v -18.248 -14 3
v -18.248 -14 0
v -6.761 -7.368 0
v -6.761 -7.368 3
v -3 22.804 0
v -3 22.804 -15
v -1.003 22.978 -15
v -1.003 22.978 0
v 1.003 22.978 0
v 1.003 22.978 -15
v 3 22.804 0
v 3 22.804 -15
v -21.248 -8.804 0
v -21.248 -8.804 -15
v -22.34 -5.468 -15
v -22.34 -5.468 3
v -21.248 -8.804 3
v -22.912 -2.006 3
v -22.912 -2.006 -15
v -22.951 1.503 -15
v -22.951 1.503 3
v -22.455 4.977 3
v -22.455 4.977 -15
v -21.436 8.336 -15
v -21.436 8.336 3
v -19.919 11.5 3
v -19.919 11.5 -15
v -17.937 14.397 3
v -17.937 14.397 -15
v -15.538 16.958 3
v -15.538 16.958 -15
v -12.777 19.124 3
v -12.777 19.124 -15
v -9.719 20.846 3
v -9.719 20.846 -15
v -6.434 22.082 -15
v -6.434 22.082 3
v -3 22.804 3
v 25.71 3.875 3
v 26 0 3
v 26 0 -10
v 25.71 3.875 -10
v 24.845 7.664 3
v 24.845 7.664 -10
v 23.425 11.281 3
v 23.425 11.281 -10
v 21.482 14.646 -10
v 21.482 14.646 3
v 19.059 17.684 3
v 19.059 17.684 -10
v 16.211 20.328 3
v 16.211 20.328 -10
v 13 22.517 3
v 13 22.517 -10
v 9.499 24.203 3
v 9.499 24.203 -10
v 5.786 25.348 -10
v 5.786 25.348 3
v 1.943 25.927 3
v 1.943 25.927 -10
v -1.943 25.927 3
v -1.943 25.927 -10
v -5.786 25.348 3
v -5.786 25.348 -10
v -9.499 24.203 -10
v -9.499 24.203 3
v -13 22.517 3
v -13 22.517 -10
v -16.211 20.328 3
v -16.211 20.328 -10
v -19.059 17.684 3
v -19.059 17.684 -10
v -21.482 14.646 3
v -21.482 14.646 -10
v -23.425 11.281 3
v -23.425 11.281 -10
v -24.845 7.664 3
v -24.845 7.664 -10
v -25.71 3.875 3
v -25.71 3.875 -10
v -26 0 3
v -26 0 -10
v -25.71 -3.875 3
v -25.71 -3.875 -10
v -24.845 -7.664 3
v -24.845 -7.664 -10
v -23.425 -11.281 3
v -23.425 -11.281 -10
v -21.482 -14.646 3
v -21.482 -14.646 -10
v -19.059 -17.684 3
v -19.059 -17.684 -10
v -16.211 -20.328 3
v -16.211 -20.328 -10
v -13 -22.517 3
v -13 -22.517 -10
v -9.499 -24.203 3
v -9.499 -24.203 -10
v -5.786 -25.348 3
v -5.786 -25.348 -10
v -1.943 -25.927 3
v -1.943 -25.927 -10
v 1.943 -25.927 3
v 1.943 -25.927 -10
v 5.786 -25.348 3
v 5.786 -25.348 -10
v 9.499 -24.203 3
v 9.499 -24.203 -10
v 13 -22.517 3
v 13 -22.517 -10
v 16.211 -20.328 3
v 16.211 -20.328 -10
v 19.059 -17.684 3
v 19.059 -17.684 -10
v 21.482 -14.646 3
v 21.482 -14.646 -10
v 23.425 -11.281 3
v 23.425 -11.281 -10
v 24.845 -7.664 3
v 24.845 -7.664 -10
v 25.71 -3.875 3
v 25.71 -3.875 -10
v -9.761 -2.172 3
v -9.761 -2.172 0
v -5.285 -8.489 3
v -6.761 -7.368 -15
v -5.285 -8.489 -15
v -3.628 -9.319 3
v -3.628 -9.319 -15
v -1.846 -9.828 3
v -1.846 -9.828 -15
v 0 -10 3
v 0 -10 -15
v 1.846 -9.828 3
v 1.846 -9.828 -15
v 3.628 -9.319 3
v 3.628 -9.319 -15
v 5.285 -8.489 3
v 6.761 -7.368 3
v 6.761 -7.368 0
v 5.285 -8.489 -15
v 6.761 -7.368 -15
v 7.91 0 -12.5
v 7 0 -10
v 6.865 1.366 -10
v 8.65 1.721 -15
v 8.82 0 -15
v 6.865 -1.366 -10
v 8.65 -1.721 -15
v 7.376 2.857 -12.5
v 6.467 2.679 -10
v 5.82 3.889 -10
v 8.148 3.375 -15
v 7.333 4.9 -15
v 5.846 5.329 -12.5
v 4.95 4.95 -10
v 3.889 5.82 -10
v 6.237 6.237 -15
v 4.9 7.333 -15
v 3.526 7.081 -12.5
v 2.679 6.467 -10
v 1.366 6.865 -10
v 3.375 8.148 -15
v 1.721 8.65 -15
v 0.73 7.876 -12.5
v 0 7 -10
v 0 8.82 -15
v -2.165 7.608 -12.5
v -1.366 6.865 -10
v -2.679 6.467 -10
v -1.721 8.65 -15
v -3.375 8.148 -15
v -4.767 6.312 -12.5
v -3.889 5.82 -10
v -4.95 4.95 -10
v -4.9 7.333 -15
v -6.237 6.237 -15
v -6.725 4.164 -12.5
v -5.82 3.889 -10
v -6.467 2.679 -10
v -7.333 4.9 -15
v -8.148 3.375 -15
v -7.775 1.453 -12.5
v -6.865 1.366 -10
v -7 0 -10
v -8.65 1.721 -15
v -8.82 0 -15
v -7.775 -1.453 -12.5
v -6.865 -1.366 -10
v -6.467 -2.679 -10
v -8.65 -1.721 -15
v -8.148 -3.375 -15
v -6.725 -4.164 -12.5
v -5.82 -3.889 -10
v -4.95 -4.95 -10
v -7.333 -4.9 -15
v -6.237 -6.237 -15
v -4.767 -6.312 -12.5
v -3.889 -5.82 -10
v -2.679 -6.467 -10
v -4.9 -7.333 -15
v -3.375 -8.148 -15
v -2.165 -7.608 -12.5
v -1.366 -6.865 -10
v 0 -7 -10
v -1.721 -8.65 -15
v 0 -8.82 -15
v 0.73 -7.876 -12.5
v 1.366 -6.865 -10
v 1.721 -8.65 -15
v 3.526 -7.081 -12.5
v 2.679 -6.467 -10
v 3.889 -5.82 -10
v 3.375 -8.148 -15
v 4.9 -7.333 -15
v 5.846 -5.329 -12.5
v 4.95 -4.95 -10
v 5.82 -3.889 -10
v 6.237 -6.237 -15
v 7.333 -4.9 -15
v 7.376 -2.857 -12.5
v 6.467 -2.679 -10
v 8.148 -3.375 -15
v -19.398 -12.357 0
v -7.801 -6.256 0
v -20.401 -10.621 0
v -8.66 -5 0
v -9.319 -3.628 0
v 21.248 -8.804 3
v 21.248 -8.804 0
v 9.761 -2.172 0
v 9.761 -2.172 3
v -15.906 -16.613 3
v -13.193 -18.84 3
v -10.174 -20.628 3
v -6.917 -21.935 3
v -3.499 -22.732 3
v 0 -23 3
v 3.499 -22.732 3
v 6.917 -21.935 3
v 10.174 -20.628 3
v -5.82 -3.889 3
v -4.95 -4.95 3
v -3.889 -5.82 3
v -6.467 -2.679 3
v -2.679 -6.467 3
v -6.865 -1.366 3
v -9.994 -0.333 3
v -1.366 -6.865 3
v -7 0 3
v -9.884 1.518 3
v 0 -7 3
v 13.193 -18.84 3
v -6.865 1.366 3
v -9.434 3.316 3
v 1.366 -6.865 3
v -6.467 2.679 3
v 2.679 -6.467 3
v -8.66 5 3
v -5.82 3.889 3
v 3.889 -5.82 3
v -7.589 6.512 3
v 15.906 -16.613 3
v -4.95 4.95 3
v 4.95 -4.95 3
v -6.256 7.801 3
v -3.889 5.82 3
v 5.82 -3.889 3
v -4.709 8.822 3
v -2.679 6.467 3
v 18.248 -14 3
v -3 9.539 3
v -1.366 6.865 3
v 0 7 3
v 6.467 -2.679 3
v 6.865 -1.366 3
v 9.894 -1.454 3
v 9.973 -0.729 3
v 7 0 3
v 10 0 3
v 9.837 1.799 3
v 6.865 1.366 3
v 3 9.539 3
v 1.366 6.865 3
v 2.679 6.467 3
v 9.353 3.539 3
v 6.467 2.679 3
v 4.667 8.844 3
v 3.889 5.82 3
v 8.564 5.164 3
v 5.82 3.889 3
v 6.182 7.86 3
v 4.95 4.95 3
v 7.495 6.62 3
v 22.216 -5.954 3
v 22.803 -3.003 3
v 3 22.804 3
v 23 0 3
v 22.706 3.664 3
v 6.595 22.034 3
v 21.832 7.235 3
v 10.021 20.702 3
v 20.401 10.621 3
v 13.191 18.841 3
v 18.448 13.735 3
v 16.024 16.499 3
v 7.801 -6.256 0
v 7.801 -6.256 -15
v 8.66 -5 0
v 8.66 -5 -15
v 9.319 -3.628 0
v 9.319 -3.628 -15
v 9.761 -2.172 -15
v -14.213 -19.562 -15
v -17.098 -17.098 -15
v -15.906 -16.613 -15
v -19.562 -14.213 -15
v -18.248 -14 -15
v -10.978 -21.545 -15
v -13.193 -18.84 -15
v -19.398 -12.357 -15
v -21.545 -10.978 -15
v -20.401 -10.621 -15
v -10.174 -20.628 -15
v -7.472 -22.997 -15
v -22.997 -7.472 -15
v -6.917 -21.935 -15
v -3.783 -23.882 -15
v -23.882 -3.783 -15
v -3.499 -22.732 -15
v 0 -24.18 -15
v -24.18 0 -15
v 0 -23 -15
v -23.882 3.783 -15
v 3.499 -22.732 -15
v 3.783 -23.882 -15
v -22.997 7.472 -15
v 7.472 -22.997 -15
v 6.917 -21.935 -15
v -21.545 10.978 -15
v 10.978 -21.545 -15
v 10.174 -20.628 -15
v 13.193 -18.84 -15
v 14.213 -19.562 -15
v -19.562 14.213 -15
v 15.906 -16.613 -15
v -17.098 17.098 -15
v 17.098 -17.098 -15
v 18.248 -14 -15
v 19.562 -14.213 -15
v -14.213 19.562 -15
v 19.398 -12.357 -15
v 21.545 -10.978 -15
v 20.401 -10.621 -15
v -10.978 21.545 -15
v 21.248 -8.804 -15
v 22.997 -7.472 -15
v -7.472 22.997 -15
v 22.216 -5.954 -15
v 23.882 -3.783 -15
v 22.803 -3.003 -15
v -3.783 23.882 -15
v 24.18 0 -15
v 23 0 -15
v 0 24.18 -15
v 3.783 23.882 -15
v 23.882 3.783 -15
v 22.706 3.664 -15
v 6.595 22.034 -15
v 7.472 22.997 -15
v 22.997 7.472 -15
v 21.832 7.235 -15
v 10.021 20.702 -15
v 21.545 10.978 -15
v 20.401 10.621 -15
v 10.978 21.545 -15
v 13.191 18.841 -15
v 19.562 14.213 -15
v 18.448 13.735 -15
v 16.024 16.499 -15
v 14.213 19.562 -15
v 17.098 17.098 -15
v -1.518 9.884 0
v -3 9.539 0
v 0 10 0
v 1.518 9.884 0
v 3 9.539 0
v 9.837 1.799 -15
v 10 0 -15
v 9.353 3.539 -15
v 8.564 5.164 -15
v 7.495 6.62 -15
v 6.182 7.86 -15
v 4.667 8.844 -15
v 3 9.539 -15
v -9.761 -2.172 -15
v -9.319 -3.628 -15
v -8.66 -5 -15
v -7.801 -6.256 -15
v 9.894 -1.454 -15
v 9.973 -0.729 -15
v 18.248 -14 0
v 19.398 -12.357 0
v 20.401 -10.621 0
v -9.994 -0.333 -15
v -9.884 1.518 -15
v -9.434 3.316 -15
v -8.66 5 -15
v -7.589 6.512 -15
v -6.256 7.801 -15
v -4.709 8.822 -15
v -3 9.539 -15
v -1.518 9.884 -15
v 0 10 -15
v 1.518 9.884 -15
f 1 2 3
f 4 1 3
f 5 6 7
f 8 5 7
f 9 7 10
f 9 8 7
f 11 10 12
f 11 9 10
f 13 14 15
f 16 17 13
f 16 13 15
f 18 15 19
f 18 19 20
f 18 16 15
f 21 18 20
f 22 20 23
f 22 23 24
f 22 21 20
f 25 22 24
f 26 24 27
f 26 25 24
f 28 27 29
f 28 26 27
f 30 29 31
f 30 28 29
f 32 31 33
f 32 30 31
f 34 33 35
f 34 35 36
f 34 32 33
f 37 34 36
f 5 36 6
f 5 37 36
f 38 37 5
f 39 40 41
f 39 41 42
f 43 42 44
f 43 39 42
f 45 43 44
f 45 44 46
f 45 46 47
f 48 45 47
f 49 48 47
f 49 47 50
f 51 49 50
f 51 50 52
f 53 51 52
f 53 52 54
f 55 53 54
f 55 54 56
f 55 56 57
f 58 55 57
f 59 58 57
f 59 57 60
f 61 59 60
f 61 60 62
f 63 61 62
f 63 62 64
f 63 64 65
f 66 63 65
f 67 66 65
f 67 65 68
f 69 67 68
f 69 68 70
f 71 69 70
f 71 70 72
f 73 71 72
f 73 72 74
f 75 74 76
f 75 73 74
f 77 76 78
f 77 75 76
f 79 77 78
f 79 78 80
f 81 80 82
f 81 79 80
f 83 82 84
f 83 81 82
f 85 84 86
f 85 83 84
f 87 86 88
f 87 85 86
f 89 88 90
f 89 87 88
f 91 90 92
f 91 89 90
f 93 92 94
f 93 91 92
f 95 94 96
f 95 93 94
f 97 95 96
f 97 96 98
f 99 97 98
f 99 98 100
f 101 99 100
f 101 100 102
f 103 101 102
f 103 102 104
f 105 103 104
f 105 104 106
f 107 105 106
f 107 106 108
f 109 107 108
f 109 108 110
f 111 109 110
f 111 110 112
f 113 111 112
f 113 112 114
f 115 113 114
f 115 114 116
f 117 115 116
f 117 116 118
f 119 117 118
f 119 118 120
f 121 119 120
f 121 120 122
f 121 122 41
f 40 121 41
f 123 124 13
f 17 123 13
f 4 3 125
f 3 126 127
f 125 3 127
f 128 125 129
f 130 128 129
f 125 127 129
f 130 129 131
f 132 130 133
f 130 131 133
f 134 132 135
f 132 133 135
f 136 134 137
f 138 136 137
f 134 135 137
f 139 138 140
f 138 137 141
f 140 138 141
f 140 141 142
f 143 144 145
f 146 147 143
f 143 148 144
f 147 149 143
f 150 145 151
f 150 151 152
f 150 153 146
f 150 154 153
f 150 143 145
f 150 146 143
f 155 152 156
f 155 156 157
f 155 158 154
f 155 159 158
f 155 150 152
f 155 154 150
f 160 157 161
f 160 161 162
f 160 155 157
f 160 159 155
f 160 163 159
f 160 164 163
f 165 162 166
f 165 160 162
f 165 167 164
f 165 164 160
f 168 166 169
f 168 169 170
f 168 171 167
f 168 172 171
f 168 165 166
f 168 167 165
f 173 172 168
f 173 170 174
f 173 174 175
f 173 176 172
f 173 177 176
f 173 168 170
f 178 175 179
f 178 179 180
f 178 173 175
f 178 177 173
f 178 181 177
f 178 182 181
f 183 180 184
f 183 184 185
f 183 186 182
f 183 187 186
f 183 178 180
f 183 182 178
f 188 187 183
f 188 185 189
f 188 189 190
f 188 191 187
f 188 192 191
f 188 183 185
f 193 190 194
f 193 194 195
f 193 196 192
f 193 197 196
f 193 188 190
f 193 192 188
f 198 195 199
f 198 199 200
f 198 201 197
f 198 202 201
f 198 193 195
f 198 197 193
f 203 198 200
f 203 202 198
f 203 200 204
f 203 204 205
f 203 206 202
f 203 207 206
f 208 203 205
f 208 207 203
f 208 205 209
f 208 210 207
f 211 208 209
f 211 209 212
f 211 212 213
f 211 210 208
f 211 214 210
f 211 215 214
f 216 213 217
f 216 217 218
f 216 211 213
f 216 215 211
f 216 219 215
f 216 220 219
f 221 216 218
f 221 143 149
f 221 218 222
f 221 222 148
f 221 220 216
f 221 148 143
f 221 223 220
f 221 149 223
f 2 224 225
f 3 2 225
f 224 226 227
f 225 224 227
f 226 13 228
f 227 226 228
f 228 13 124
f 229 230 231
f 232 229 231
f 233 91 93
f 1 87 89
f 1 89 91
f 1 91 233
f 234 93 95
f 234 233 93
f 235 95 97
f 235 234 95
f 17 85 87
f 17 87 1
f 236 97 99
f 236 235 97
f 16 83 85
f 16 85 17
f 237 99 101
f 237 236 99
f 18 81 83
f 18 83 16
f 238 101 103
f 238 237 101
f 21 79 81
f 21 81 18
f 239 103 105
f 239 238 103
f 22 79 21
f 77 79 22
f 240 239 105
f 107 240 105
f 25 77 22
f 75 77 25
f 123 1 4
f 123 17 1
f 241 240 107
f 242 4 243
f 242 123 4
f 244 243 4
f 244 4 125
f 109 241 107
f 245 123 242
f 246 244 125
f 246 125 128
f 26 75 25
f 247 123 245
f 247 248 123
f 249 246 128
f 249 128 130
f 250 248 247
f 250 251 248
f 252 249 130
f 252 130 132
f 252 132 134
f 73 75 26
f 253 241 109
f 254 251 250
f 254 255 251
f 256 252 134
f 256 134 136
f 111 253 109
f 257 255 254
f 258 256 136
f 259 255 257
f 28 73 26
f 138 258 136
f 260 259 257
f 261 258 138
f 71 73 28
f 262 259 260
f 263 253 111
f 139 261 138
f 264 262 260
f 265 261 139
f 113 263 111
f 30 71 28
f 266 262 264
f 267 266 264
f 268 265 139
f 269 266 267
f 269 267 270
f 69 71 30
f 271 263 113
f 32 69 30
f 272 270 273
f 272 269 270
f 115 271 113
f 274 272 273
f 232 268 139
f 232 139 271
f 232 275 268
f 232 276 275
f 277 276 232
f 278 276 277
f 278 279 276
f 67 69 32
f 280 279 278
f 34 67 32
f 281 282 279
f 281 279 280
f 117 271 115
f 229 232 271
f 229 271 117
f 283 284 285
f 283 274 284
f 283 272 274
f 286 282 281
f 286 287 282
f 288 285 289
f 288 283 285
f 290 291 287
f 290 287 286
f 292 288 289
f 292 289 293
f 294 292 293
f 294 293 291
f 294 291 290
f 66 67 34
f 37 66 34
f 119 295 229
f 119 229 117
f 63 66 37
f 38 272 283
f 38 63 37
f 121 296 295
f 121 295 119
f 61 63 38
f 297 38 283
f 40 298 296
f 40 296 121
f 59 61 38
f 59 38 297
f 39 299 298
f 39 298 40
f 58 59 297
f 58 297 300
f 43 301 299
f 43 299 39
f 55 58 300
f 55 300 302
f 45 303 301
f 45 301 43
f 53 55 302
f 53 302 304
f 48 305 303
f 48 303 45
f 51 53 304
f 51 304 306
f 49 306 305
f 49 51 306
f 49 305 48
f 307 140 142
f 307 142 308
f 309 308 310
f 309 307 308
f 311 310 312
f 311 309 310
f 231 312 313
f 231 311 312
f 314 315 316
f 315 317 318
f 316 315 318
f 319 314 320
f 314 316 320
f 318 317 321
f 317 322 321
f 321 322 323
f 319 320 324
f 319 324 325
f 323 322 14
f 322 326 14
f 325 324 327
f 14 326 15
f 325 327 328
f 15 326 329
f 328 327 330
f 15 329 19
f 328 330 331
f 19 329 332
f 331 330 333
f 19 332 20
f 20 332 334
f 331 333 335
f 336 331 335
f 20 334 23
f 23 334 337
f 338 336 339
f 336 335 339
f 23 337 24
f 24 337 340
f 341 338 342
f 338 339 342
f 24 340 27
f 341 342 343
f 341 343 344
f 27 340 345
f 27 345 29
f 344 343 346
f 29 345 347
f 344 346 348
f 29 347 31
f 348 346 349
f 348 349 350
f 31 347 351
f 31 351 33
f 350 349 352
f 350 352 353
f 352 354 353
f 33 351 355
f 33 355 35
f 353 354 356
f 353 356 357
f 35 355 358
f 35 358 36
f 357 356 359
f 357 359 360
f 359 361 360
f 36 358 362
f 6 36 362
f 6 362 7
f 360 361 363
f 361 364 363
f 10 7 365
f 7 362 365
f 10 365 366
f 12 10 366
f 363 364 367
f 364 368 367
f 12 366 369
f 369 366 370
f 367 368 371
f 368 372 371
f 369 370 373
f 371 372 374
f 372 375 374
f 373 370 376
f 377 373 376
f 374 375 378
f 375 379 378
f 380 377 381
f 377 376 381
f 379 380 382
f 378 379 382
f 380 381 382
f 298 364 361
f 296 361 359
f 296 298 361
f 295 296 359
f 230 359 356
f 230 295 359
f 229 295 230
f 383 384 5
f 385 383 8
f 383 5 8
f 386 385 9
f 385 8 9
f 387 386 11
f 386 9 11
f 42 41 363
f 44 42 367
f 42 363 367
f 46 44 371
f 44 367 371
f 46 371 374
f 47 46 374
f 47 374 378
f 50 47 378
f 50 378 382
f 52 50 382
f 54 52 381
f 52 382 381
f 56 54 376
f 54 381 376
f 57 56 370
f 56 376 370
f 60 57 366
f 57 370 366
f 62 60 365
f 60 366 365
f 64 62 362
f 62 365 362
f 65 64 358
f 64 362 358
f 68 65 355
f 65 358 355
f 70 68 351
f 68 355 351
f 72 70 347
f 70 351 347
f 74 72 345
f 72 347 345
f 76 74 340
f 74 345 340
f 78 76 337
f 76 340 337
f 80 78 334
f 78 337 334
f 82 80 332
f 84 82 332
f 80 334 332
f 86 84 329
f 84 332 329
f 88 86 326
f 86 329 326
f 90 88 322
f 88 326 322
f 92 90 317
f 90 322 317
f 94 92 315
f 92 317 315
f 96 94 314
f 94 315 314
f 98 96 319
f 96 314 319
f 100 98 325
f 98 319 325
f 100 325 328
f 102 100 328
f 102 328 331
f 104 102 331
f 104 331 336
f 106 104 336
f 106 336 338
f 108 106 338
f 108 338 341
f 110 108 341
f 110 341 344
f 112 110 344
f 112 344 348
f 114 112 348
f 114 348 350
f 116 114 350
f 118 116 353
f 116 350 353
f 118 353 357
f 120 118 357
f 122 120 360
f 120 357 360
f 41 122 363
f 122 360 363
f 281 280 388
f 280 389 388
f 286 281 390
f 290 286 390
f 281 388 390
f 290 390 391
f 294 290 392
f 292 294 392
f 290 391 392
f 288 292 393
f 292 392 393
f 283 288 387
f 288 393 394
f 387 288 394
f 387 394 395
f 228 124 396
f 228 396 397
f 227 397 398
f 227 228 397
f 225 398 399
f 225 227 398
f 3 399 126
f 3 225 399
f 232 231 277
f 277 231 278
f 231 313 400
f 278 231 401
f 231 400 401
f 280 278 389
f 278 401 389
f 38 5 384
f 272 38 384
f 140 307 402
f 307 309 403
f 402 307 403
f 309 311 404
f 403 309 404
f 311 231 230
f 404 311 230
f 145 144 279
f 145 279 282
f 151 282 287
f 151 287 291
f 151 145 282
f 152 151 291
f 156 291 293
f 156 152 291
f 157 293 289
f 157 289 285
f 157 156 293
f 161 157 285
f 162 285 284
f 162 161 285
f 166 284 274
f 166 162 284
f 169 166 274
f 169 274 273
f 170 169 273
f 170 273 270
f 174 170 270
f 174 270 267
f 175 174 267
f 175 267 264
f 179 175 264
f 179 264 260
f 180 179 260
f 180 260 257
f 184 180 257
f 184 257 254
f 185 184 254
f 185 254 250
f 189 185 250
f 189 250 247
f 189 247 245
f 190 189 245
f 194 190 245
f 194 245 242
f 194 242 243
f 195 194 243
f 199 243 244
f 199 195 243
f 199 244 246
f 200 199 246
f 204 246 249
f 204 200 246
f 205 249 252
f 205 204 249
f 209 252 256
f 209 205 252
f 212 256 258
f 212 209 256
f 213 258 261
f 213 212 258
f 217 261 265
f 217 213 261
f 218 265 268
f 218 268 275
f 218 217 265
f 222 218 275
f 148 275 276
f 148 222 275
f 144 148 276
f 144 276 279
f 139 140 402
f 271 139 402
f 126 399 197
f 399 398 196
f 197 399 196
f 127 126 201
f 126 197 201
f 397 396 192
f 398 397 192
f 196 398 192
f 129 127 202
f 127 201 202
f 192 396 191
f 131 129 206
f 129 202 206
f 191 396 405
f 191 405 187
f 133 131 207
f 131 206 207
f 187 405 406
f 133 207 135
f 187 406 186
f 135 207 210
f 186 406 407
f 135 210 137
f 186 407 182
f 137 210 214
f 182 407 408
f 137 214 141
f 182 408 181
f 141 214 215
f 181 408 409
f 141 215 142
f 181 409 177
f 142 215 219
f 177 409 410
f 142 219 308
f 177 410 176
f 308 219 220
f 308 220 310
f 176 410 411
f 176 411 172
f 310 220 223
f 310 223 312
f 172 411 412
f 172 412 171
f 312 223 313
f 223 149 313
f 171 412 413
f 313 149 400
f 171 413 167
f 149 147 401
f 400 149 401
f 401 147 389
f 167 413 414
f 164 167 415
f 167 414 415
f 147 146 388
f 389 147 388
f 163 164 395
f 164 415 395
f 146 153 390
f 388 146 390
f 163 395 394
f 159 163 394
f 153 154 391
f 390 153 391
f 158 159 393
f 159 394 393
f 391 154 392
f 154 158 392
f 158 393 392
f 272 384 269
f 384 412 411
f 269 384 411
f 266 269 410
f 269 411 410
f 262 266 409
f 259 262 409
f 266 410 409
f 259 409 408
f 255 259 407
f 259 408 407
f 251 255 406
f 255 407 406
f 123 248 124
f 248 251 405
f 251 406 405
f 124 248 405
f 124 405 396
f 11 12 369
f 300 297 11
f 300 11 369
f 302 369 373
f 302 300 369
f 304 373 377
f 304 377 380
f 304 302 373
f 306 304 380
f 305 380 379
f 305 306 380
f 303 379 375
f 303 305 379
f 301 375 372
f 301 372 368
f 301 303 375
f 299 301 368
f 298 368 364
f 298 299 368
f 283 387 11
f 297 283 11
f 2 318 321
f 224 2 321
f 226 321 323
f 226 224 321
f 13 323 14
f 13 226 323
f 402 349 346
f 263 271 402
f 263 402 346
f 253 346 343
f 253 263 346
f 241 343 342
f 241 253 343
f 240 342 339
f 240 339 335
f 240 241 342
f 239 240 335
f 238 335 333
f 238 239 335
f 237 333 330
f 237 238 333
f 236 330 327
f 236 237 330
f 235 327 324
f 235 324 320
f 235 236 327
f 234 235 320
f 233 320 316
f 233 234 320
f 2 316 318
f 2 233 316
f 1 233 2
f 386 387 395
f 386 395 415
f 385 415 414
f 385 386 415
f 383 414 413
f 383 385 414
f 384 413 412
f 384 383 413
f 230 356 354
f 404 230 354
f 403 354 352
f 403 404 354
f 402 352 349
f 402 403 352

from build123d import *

# Parameters (mm, degrees)
F0_R     = 26
F0_R_2   = 7
F1_DEPTH = 3
F2_DEPTH = 15
F3_SIZE2 = 1.819851
F3_SIZE  = 5
F4_SIZE2 = 1.819851
F4_SIZE  = 5


with BuildPart() as f1:
    # F0 (on Top) → F1 (new body)
    with BuildSketch(Plane.XY):
        Circle(F0_R)
        with BuildLine():
            ThreePointArc((3, 22.803509), (17.291616, 15.165751), (23, 0))
            ThreePointArc((23, 0), (22.557855, -4.488117), (21.248418, -8.803678))
            ThreePointArc((21.248418, -8.803678), (19.918584, -11.5), (18.248418, -13.99983))
            ThreePointArc((18.248418, -13.99983), (0, -23), (-18.248418, -13.99983))
            ThreePointArc((-18.248418, -13.99983), (-19.918584, -11.5), (-21.248418, -8.803678))
            ThreePointArc((-21.248418, -8.803678), (-19.918584, 11.5), (-3, 22.803509))
            ThreePointArc((-3, 22.803509), (0, 23), (3, 22.803509))
        make_face(mode=Mode.SUBTRACT)
        with BuildLine():
            Line((-9.761356, -2.17162), (-21.248418, -8.803678))
            ThreePointArc((-21.248418, -8.803678), (-19.918584, -11.5), (-18.248418, -13.99983))
            Line((-18.248418, -13.99983), (-6.761356, -7.367772))
            ThreePointArc((-6.761356, -7.367772), (-8.660254, -5), (-9.761356, -2.17162))
        make_face()
        with BuildLine():
            ThreePointArc((10, 0), (8.062258, 5.91608), (3, 9.539392))
            ThreePointArc((3, 9.539392), (0, 10), (-3, 9.539392))
            ThreePointArc((-3, 9.539392), (-8.660254, 5), (-9.761356, -2.17162))
            ThreePointArc((-9.761356, -2.17162), (-8.660254, -5), (-6.761356, -7.367772))
            ThreePointArc((-6.761356, -7.367772), (0, -10), (6.761356, -7.367772))
            ThreePointArc((6.761356, -7.367772), (8.660254, -5), (9.761356, -2.17162))
            ThreePointArc((9.761356, -2.17162), (9.94016, -1.092347), (10, 0))
        make_face()
        Circle(F0_R_2, mode=Mode.SUBTRACT)
        with BuildLine():
            Line((3, 9.539392), (3, 22.803509))
            ThreePointArc((3, 22.803509), (0, 23), (-3, 22.803509))
            Line((-3, 22.803509), (-3, 9.539392))
            ThreePointArc((-3, 9.539392), (0, 10), (3, 9.539392))
        make_face()
        with BuildLine():
            ThreePointArc((18.248418, -13.99983), (19.918584, -11.5), (21.248418, -8.803678))
            Line((21.248418, -8.803678), (9.761356, -2.17162))
            ThreePointArc((9.761356, -2.17162), (8.660254, -5), (6.761356, -7.367772))
            Line((6.761356, -7.367772), (18.248418, -13.99983))
        make_face()
    extrude(amount=F1_DEPTH)

    # F0 (on Top) → F2 (join)
    with BuildSketch(Plane.XY):
        Circle(F0_R)
        with BuildLine():
            ThreePointArc((3, 22.803509), (17.291616, 15.165751), (23, 0))
            ThreePointArc((23, 0), (22.557855, -4.488117), (21.248418, -8.803678))
            ThreePointArc((21.248418, -8.803678), (19.918584, -11.5), (18.248418, -13.99983))
            ThreePointArc((18.248418, -13.99983), (0, -23), (-18.248418, -13.99983))
            ThreePointArc((-18.248418, -13.99983), (-19.918584, -11.5), (-21.248418, -8.803678))
            ThreePointArc((-21.248418, -8.803678), (-19.918584, 11.5), (-3, 22.803509))
            ThreePointArc((-3, 22.803509), (0, 23), (3, 22.803509))
        make_face(mode=Mode.SUBTRACT)
        with BuildLine():
            ThreePointArc((10, 0), (8.062258, 5.91608), (3, 9.539392))
            ThreePointArc((3, 9.539392), (0, 10), (-3, 9.539392))
            ThreePointArc((-3, 9.539392), (-8.660254, 5), (-9.761356, -2.17162))
            ThreePointArc((-9.761356, -2.17162), (-8.660254, -5), (-6.761356, -7.367772))
            ThreePointArc((-6.761356, -7.367772), (0, -10), (6.761356, -7.367772))
            ThreePointArc((6.761356, -7.367772), (8.660254, -5), (9.761356, -2.17162))
            ThreePointArc((9.761356, -2.17162), (9.94016, -1.092347), (10, 0))
        make_face()
        Circle(F0_R_2, mode=Mode.SUBTRACT)
    extrude(amount=-F2_DEPTH)

    # F3
    f3_edges = [f1.edges().sort_by_distance(p)[0] for p in [
        (-26, 0, -15),
    ]]
    chamfer(f3_edges, length=F3_SIZE, length2=F3_SIZE2)

    # F4
    f4_edges = [f1.edges().sort_by_distance(p)[0] for p in [
        (-7, 0, -15),
    ]]
    chamfer(f4_edges, length=F4_SIZE, length2=F4_SIZE2)


solid = f1.part
